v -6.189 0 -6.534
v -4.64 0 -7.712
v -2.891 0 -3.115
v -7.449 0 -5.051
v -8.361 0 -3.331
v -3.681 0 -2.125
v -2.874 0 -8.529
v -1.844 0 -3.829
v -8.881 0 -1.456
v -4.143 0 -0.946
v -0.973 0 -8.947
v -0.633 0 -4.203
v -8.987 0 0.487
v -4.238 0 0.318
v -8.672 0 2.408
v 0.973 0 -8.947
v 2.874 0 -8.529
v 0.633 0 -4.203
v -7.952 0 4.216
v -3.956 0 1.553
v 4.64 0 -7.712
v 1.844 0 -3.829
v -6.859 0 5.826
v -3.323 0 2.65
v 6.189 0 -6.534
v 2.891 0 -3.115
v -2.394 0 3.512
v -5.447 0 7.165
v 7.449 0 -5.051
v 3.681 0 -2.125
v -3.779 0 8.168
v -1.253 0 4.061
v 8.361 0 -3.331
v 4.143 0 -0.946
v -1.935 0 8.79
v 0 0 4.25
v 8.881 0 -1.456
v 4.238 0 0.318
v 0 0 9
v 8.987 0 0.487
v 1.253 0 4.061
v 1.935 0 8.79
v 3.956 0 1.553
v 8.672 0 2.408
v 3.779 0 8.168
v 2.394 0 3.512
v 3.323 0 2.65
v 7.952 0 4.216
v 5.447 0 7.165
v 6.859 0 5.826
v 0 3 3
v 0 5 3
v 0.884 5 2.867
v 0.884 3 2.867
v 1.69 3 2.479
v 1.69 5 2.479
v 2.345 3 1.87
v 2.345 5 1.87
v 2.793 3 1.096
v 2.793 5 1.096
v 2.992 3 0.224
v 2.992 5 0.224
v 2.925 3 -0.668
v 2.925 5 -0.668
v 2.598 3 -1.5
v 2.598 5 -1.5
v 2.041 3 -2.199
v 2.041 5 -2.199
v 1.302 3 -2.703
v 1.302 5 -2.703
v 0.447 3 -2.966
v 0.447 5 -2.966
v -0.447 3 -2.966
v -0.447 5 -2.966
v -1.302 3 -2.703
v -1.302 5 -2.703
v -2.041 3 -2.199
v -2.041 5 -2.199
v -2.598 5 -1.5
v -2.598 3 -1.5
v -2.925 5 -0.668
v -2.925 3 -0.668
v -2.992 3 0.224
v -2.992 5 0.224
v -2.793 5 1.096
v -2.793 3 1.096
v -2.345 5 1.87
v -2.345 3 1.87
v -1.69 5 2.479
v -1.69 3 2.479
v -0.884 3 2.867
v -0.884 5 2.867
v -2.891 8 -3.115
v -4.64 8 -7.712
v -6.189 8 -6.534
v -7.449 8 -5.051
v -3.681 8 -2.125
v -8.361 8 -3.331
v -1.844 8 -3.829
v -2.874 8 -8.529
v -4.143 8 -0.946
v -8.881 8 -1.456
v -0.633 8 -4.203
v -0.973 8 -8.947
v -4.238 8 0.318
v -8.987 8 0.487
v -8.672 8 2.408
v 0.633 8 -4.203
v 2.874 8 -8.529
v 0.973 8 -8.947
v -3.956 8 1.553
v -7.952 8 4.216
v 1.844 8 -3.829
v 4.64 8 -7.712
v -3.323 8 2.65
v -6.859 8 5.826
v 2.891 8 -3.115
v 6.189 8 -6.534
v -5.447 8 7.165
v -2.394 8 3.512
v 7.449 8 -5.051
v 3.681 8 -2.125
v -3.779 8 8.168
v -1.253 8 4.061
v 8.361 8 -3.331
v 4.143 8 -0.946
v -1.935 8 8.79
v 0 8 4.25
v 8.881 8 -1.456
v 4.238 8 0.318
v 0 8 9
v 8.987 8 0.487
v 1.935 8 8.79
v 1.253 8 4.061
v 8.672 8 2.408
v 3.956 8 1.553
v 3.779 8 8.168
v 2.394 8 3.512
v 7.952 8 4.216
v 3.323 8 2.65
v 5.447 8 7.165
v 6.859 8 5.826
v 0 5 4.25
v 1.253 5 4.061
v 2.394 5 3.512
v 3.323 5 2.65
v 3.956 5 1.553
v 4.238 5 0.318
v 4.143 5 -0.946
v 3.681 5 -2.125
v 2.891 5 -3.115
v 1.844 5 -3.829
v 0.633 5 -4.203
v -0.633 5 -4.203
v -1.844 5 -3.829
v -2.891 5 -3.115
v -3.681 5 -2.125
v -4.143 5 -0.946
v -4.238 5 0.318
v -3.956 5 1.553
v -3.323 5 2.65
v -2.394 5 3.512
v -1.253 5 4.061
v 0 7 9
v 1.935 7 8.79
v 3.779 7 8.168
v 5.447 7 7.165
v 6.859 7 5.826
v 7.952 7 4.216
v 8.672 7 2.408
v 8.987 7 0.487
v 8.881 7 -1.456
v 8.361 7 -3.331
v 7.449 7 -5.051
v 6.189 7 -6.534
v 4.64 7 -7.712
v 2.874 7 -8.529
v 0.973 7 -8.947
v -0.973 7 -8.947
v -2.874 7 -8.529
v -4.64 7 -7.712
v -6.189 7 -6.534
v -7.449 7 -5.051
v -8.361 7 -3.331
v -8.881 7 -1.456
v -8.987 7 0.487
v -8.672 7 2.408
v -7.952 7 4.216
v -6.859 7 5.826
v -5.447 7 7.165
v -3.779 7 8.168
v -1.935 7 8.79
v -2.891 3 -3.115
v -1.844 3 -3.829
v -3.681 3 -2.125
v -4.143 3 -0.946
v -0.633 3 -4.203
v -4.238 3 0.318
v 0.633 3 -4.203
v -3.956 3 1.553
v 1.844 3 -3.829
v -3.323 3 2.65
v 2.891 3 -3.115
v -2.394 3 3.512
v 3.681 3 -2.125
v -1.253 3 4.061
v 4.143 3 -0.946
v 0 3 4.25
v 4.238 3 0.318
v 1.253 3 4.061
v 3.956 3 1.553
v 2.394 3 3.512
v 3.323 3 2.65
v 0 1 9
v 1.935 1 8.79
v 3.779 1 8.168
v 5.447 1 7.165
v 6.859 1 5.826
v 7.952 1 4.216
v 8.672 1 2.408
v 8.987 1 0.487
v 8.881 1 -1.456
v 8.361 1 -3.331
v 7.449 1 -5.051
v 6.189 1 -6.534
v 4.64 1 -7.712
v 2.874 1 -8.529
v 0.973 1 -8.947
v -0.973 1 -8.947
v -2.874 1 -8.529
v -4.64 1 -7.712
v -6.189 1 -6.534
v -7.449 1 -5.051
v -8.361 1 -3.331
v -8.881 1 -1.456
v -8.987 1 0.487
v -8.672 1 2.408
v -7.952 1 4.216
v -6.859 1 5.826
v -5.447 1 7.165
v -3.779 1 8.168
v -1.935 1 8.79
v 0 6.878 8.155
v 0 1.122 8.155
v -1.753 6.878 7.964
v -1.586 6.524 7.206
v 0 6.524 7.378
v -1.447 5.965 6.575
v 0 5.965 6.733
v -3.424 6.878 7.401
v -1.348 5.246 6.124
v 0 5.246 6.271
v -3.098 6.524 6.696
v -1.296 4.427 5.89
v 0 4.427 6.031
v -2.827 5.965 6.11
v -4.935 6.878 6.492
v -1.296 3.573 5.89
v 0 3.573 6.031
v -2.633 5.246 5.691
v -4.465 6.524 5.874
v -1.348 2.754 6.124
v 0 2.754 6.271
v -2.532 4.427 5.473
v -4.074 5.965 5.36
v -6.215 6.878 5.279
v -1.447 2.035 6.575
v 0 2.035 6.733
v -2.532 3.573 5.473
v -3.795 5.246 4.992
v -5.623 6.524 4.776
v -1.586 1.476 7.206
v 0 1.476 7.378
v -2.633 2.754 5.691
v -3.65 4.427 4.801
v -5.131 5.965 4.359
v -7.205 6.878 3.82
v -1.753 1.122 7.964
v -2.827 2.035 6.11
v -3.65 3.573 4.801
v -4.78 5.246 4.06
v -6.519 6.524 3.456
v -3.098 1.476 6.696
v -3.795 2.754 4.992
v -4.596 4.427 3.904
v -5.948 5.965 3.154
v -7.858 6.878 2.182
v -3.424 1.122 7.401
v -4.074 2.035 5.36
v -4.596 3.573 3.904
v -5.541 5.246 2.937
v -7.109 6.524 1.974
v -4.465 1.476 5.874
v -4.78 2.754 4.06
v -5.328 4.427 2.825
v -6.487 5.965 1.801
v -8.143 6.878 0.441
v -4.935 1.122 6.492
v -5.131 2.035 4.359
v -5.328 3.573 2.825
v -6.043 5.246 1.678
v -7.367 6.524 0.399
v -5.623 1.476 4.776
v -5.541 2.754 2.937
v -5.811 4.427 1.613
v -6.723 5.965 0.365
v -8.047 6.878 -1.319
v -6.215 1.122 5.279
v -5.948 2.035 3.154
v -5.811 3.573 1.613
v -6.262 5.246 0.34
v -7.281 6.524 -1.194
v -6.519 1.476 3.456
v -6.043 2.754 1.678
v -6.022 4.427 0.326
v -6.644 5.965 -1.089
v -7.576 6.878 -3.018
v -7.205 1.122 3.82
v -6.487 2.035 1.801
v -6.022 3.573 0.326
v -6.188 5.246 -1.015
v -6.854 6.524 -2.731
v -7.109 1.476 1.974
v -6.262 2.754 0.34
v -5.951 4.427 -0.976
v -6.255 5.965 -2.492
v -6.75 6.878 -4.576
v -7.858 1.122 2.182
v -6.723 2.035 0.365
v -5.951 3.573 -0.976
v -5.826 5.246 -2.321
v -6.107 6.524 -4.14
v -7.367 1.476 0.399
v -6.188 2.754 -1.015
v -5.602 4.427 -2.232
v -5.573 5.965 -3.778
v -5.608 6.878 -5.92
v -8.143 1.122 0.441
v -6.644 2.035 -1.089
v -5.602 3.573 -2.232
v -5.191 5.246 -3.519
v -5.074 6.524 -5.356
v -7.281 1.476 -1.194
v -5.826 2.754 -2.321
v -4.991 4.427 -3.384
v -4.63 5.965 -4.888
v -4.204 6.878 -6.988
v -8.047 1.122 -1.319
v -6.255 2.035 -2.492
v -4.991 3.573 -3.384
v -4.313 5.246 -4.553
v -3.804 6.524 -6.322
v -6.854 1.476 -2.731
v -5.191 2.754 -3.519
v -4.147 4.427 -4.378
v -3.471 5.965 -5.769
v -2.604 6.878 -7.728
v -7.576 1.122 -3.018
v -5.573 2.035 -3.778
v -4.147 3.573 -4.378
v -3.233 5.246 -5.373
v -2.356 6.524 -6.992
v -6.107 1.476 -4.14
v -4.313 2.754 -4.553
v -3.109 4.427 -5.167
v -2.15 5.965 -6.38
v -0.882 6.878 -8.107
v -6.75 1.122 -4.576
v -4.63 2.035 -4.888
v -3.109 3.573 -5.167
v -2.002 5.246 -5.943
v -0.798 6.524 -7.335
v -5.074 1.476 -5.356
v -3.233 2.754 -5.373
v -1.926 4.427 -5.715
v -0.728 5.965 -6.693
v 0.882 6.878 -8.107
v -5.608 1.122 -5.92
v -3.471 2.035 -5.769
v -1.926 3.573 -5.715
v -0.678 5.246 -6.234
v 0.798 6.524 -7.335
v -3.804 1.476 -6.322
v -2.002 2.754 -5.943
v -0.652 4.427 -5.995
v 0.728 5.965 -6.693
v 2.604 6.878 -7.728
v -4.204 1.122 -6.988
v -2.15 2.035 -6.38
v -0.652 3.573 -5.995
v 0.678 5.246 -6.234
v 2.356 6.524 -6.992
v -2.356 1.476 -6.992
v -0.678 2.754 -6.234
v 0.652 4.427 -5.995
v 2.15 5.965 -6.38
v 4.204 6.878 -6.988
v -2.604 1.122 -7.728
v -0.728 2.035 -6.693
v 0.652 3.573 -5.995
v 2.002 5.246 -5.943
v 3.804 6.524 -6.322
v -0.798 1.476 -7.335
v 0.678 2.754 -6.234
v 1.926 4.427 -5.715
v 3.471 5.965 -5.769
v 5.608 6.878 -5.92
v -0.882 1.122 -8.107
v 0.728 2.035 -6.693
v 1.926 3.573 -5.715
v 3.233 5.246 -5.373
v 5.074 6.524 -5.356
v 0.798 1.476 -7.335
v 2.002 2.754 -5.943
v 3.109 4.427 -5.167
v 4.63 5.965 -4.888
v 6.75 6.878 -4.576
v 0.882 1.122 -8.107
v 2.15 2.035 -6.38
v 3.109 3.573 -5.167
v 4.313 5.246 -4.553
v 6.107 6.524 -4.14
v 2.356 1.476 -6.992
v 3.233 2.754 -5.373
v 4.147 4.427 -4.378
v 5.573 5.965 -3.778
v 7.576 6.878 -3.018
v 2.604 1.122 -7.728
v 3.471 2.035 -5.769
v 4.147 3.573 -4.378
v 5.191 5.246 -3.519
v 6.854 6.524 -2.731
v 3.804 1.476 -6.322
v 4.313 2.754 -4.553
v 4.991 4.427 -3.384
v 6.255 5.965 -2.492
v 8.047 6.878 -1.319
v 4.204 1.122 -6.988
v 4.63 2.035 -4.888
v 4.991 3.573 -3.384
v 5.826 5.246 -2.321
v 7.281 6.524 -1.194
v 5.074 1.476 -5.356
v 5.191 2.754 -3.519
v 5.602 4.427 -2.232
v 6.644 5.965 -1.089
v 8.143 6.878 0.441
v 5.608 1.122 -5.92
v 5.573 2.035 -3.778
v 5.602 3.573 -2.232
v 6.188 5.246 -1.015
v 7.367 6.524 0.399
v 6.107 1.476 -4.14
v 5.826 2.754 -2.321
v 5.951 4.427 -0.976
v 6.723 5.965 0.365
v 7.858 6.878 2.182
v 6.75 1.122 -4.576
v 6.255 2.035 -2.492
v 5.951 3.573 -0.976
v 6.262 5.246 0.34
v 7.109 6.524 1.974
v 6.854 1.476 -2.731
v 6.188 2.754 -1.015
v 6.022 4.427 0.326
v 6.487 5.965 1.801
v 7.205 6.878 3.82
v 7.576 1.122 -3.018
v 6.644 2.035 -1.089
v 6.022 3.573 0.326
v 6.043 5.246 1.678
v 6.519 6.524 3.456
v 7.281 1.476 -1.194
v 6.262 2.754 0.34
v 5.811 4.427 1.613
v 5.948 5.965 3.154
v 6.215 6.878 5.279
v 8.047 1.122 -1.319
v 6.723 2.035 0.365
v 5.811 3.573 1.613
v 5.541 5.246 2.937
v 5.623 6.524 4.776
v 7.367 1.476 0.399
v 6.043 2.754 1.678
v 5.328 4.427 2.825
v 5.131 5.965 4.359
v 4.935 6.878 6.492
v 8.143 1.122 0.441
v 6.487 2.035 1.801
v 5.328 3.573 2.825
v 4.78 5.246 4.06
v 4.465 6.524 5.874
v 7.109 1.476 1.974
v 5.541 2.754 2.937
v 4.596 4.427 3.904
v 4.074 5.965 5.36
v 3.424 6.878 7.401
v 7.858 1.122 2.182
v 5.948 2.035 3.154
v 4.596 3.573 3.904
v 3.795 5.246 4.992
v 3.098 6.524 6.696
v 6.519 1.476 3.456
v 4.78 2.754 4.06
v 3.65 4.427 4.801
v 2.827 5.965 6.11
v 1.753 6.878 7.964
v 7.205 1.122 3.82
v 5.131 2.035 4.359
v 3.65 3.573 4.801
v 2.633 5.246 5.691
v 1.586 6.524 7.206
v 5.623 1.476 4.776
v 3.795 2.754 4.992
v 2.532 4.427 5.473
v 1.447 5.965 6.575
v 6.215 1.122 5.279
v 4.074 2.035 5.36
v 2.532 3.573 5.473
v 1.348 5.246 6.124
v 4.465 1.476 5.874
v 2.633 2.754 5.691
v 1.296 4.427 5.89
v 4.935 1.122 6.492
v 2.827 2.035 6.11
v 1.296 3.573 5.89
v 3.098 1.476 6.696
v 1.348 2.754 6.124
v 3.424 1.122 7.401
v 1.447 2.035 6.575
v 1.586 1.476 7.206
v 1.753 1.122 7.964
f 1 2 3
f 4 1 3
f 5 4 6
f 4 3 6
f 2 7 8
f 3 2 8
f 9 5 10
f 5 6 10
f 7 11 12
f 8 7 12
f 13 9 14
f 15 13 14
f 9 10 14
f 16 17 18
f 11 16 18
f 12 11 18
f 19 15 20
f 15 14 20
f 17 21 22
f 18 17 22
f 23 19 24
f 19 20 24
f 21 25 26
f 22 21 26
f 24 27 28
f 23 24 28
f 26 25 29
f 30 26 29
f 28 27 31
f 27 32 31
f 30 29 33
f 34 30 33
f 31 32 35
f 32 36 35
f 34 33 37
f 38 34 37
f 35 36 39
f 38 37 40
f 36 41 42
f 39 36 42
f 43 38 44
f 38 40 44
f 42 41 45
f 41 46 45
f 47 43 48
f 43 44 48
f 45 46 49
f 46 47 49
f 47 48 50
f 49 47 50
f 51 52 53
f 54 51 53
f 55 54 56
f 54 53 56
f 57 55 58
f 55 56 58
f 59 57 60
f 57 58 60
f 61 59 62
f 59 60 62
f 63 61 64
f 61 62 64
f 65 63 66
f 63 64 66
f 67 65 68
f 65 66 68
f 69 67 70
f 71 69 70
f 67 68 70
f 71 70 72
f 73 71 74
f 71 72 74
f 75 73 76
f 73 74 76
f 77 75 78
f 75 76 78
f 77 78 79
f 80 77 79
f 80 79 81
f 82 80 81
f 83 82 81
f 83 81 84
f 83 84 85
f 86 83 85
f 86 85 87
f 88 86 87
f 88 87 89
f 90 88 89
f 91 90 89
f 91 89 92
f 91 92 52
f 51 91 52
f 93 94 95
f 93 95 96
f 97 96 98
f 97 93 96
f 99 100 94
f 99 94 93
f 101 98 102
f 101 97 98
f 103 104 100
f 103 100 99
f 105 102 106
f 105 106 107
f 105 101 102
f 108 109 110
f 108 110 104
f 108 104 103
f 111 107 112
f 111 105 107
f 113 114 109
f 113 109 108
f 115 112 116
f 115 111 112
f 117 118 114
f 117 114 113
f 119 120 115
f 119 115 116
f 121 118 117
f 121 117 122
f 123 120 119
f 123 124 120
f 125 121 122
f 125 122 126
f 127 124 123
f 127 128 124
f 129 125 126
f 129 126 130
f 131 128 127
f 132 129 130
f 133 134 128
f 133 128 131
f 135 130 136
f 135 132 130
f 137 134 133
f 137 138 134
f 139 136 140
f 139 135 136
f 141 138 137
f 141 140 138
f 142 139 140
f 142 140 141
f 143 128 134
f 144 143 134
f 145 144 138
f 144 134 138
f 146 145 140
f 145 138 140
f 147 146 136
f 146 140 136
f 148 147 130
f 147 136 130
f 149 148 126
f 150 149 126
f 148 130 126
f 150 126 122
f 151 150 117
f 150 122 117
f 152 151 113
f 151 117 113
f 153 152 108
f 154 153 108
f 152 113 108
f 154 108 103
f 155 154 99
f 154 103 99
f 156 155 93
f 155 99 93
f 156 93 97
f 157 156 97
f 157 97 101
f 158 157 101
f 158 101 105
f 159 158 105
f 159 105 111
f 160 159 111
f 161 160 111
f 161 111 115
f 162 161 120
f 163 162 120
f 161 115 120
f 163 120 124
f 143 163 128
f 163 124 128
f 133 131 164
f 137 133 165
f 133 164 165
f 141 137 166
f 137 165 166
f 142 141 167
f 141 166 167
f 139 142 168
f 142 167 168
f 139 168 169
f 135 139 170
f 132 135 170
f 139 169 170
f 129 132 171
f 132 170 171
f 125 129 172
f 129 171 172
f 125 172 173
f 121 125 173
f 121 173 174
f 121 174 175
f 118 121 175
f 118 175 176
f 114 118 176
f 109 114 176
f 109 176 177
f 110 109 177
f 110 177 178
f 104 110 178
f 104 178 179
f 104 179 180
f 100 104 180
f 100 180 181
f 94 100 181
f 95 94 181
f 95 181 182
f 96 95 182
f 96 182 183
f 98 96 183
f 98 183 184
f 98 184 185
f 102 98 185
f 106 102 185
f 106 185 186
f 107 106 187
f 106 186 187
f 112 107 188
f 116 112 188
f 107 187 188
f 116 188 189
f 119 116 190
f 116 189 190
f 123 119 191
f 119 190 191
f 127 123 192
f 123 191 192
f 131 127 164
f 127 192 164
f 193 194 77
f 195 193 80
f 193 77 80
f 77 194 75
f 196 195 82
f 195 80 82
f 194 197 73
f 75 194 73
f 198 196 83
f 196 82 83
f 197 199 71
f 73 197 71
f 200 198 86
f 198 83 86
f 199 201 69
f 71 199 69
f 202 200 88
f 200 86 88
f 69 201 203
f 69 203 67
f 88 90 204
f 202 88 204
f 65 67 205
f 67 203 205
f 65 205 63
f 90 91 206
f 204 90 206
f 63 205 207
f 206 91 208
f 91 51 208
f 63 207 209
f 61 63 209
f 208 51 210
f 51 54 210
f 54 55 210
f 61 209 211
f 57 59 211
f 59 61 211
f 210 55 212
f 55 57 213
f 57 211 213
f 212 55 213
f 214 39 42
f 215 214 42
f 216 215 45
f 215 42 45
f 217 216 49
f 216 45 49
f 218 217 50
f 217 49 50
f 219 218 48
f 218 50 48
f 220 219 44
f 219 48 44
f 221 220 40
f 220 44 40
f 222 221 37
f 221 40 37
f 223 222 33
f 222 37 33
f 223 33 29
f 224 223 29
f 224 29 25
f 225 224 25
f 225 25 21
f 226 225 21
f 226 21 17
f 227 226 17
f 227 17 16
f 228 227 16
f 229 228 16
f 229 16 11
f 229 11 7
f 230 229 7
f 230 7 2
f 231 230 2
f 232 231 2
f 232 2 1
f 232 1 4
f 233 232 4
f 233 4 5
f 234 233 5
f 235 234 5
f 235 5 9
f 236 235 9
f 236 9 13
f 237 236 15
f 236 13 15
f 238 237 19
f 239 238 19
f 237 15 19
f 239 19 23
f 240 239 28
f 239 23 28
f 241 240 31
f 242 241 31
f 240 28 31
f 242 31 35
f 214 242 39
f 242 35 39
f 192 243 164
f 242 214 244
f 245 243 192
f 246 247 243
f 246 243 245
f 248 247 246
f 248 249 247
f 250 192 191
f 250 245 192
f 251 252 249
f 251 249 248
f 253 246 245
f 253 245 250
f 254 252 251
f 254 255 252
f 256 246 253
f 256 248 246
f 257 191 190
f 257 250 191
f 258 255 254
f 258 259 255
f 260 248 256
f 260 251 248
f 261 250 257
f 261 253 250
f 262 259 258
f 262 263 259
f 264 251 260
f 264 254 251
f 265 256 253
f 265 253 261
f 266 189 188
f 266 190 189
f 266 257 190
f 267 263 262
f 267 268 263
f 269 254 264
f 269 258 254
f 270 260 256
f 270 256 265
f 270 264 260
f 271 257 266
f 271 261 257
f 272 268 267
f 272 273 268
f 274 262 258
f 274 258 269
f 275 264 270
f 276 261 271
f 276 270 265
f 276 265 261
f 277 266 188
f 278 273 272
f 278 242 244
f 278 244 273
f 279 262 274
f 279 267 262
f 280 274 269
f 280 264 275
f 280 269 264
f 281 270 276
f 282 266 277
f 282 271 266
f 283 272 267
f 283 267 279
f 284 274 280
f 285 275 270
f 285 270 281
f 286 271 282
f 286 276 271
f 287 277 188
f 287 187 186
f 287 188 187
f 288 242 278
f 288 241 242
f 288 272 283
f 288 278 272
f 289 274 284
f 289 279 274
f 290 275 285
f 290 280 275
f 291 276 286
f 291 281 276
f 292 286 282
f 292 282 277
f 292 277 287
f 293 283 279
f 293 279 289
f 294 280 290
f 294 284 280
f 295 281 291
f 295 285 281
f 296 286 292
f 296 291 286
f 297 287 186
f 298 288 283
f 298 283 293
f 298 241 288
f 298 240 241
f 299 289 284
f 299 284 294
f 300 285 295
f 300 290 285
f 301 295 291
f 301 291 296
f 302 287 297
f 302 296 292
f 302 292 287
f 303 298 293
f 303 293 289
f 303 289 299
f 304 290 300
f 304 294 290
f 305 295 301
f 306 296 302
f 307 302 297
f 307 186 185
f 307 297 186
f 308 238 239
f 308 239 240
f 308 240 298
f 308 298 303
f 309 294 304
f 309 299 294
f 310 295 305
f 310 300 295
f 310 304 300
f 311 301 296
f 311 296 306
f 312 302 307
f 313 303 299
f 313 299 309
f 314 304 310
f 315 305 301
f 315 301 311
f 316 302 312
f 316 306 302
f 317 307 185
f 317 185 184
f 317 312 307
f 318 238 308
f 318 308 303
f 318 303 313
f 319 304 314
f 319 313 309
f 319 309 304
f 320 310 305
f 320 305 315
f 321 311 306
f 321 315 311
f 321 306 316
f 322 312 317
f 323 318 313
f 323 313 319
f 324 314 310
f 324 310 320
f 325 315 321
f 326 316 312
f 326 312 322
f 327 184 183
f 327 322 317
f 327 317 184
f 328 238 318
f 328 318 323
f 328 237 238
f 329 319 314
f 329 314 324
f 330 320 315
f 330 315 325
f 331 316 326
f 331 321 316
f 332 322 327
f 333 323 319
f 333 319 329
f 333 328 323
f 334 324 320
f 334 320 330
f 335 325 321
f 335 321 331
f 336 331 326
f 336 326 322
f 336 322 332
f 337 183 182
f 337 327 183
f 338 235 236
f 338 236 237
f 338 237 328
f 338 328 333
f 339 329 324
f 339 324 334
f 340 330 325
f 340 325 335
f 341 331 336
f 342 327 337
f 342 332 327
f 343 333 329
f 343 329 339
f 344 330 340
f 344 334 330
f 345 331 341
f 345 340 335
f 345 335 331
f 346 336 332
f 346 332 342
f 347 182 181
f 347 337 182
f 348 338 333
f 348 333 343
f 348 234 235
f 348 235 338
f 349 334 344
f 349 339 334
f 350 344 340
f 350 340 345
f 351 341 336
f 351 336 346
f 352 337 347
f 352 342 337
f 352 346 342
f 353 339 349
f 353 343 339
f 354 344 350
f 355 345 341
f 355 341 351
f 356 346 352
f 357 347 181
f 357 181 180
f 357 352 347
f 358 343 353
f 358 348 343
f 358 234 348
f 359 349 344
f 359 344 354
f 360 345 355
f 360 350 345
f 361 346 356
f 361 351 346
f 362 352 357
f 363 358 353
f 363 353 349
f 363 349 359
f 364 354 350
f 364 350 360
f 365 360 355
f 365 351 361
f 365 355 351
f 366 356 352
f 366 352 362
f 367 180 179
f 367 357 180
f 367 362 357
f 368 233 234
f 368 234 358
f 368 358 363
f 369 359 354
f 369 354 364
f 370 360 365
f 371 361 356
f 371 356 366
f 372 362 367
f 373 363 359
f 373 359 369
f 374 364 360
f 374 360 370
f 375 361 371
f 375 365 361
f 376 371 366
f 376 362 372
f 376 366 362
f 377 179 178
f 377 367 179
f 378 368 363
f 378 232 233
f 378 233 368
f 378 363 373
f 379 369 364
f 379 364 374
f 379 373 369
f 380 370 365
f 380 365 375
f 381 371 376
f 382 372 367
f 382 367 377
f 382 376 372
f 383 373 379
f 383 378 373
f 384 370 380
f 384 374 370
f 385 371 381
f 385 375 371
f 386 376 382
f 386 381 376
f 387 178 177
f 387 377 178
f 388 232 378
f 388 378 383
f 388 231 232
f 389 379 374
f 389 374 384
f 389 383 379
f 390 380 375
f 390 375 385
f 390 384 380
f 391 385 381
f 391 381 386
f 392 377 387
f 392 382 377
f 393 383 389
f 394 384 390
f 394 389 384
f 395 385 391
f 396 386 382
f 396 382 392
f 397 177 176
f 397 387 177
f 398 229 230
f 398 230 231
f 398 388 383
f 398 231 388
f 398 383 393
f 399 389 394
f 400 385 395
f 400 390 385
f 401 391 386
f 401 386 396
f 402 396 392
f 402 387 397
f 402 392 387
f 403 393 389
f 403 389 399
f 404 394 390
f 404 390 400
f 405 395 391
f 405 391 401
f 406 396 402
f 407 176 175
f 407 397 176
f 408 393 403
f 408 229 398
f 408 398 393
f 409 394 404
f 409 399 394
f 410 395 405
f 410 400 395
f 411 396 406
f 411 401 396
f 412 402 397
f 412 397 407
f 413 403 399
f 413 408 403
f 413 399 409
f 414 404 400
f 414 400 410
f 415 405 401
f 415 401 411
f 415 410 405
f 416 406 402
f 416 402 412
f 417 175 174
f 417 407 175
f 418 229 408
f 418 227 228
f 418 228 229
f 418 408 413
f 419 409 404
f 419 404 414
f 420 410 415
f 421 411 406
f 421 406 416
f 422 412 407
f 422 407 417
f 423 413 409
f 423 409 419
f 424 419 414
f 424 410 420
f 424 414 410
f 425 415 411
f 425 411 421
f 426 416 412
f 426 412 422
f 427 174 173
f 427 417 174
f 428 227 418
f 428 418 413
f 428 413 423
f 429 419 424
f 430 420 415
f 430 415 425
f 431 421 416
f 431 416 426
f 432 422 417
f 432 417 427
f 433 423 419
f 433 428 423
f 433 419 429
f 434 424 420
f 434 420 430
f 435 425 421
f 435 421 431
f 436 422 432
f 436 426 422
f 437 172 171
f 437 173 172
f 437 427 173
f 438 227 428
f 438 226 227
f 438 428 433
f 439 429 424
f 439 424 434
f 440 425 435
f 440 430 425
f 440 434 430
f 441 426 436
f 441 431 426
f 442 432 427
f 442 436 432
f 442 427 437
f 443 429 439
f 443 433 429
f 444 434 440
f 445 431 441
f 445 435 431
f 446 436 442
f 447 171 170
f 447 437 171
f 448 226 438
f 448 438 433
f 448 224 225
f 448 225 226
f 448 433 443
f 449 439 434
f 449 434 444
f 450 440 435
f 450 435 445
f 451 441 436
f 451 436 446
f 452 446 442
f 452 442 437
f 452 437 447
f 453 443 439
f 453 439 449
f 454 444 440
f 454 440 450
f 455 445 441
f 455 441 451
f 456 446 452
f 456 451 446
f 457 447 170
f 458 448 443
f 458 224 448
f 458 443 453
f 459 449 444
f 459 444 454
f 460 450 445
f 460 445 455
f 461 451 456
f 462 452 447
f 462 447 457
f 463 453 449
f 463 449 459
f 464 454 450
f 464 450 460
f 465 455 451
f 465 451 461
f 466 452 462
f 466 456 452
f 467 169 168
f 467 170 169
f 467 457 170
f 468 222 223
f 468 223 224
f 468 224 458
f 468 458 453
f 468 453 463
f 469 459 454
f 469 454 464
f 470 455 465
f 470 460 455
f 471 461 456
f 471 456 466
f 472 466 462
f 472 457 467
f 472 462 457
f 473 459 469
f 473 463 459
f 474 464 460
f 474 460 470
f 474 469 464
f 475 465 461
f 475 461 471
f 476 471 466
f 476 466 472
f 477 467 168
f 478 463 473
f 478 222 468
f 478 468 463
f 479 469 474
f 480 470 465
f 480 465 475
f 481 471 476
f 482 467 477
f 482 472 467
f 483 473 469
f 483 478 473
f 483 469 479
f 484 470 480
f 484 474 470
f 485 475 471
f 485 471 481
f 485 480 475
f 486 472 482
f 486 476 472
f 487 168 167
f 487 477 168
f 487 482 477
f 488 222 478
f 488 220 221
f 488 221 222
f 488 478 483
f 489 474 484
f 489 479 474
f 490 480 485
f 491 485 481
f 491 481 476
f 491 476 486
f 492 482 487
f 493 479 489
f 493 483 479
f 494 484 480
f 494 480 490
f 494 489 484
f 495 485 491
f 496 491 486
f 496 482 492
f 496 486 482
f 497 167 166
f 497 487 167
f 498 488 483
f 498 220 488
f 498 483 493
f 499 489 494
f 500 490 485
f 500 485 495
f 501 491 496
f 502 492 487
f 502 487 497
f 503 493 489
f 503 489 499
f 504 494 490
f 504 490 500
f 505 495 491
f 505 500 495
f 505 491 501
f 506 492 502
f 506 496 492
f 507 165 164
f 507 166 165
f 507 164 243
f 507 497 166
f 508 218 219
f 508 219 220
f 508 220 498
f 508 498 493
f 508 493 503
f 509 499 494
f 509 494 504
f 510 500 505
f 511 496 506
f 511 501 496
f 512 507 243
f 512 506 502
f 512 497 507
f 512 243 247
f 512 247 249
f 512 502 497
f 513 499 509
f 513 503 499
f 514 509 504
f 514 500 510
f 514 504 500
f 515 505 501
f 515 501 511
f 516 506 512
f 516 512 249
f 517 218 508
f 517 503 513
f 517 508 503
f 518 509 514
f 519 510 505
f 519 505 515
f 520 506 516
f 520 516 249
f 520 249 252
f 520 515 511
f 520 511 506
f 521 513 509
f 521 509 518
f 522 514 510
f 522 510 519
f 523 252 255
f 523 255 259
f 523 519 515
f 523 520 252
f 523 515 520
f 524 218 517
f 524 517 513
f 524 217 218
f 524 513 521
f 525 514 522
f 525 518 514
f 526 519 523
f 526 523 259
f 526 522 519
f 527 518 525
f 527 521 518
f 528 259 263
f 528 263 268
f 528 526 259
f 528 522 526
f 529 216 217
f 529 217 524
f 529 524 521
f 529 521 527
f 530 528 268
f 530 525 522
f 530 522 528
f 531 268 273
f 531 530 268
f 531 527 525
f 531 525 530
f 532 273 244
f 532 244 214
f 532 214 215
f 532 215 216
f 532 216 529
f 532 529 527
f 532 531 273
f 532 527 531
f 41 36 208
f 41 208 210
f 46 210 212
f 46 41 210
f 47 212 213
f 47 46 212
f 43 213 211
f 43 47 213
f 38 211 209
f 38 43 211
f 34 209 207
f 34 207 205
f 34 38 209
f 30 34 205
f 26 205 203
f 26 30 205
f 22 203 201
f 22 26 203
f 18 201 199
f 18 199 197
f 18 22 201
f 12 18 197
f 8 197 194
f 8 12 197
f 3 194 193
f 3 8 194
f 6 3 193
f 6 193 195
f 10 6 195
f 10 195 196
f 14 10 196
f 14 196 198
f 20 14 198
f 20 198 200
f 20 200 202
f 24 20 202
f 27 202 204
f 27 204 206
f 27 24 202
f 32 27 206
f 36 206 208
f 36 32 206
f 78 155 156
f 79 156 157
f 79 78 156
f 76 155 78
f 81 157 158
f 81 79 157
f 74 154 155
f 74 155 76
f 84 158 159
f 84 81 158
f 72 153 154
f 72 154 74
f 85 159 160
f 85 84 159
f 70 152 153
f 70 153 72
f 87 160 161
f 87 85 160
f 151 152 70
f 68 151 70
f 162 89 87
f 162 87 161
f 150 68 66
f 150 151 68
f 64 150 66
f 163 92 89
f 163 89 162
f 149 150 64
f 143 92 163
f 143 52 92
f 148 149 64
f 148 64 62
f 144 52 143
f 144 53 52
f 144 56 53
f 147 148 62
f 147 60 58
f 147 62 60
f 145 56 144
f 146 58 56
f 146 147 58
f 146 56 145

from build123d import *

# Parameters (mm, degrees)
SKETCH_1_R          = 9
EXTRUDE_1_DEPTH     = 8
SKETCH_5_R          = 3
SKETCH_2_R          = 3
CUT_EXTRUDE_1_DEPTH = 16.033296378
SKETCH_6_R          = 4.25
CUT_EXTRUDE_2_DEPTH = 3


with BuildPart() as part:
    # 草图1 → 凸台-拉伸1 (new body)
    with BuildSketch(Plane(origin=(0, 0, 0), x_dir=(1, 0, 0), z_dir=(0, 1, 0))):
        with Locations(Location((0, 0, 0), (0, 0, 270))):
            Circle(SKETCH_1_R)
    extrude(amount=EXTRUDE_1_DEPTH)

    # 草图5 → 切除-旋转1 (revolve, cut)
    with BuildSketch(Plane(origin=(0, 0, 0), x_dir=(0, 0, -1), z_dir=(1, 0, 0)), mode=Mode.PRIVATE) as cut_revolve_1_sk:
        with Locations((9, 4)):
            Circle(SKETCH_5_R)
    revolve(cut_revolve_1_sk.sketch.rotate(Axis((0, 8, 0), (0, -1, 0)), 180), axis=Axis((0, 8, 0), (0, -1, 0)), mode=Mode.SUBTRACT)

    # 草图2 → 切除-拉伸1 (cut, through all)
    with BuildSketch(Plane(origin=(0, 8, 0), x_dir=(1, 0, 0), z_dir=(0, 1, 0))):
        with Locations(Location((0, 0, 0), (0, 0, 270))):
            Circle(SKETCH_2_R)
    extrude(amount=-CUT_EXTRUDE_1_DEPTH, mode=Mode.SUBTRACT)

    # 草图6 → 切除-拉伸2 (cut)
    with BuildSketch(Plane(origin=(0, 8, 0), x_dir=(1, 0, 0), z_dir=(0, 1, 0))):
        with Locations(Location((0, 0, 0), (0, 0, 270))):
            Circle(SKETCH_6_R)
    cut_extrude_2 = extrude(amount=-CUT_EXTRUDE_2_DEPTH, mode=Mode.SUBTRACT)

    # 镜向2: 切除-拉伸2 across plane
    add(cut_extrude_2.mirror(Plane(origin=(0, 4, 0), x_dir=(0, 0, 1), z_dir=(0, -1, 0))), mode=Mode.SUBTRACT)


solid = part.part
